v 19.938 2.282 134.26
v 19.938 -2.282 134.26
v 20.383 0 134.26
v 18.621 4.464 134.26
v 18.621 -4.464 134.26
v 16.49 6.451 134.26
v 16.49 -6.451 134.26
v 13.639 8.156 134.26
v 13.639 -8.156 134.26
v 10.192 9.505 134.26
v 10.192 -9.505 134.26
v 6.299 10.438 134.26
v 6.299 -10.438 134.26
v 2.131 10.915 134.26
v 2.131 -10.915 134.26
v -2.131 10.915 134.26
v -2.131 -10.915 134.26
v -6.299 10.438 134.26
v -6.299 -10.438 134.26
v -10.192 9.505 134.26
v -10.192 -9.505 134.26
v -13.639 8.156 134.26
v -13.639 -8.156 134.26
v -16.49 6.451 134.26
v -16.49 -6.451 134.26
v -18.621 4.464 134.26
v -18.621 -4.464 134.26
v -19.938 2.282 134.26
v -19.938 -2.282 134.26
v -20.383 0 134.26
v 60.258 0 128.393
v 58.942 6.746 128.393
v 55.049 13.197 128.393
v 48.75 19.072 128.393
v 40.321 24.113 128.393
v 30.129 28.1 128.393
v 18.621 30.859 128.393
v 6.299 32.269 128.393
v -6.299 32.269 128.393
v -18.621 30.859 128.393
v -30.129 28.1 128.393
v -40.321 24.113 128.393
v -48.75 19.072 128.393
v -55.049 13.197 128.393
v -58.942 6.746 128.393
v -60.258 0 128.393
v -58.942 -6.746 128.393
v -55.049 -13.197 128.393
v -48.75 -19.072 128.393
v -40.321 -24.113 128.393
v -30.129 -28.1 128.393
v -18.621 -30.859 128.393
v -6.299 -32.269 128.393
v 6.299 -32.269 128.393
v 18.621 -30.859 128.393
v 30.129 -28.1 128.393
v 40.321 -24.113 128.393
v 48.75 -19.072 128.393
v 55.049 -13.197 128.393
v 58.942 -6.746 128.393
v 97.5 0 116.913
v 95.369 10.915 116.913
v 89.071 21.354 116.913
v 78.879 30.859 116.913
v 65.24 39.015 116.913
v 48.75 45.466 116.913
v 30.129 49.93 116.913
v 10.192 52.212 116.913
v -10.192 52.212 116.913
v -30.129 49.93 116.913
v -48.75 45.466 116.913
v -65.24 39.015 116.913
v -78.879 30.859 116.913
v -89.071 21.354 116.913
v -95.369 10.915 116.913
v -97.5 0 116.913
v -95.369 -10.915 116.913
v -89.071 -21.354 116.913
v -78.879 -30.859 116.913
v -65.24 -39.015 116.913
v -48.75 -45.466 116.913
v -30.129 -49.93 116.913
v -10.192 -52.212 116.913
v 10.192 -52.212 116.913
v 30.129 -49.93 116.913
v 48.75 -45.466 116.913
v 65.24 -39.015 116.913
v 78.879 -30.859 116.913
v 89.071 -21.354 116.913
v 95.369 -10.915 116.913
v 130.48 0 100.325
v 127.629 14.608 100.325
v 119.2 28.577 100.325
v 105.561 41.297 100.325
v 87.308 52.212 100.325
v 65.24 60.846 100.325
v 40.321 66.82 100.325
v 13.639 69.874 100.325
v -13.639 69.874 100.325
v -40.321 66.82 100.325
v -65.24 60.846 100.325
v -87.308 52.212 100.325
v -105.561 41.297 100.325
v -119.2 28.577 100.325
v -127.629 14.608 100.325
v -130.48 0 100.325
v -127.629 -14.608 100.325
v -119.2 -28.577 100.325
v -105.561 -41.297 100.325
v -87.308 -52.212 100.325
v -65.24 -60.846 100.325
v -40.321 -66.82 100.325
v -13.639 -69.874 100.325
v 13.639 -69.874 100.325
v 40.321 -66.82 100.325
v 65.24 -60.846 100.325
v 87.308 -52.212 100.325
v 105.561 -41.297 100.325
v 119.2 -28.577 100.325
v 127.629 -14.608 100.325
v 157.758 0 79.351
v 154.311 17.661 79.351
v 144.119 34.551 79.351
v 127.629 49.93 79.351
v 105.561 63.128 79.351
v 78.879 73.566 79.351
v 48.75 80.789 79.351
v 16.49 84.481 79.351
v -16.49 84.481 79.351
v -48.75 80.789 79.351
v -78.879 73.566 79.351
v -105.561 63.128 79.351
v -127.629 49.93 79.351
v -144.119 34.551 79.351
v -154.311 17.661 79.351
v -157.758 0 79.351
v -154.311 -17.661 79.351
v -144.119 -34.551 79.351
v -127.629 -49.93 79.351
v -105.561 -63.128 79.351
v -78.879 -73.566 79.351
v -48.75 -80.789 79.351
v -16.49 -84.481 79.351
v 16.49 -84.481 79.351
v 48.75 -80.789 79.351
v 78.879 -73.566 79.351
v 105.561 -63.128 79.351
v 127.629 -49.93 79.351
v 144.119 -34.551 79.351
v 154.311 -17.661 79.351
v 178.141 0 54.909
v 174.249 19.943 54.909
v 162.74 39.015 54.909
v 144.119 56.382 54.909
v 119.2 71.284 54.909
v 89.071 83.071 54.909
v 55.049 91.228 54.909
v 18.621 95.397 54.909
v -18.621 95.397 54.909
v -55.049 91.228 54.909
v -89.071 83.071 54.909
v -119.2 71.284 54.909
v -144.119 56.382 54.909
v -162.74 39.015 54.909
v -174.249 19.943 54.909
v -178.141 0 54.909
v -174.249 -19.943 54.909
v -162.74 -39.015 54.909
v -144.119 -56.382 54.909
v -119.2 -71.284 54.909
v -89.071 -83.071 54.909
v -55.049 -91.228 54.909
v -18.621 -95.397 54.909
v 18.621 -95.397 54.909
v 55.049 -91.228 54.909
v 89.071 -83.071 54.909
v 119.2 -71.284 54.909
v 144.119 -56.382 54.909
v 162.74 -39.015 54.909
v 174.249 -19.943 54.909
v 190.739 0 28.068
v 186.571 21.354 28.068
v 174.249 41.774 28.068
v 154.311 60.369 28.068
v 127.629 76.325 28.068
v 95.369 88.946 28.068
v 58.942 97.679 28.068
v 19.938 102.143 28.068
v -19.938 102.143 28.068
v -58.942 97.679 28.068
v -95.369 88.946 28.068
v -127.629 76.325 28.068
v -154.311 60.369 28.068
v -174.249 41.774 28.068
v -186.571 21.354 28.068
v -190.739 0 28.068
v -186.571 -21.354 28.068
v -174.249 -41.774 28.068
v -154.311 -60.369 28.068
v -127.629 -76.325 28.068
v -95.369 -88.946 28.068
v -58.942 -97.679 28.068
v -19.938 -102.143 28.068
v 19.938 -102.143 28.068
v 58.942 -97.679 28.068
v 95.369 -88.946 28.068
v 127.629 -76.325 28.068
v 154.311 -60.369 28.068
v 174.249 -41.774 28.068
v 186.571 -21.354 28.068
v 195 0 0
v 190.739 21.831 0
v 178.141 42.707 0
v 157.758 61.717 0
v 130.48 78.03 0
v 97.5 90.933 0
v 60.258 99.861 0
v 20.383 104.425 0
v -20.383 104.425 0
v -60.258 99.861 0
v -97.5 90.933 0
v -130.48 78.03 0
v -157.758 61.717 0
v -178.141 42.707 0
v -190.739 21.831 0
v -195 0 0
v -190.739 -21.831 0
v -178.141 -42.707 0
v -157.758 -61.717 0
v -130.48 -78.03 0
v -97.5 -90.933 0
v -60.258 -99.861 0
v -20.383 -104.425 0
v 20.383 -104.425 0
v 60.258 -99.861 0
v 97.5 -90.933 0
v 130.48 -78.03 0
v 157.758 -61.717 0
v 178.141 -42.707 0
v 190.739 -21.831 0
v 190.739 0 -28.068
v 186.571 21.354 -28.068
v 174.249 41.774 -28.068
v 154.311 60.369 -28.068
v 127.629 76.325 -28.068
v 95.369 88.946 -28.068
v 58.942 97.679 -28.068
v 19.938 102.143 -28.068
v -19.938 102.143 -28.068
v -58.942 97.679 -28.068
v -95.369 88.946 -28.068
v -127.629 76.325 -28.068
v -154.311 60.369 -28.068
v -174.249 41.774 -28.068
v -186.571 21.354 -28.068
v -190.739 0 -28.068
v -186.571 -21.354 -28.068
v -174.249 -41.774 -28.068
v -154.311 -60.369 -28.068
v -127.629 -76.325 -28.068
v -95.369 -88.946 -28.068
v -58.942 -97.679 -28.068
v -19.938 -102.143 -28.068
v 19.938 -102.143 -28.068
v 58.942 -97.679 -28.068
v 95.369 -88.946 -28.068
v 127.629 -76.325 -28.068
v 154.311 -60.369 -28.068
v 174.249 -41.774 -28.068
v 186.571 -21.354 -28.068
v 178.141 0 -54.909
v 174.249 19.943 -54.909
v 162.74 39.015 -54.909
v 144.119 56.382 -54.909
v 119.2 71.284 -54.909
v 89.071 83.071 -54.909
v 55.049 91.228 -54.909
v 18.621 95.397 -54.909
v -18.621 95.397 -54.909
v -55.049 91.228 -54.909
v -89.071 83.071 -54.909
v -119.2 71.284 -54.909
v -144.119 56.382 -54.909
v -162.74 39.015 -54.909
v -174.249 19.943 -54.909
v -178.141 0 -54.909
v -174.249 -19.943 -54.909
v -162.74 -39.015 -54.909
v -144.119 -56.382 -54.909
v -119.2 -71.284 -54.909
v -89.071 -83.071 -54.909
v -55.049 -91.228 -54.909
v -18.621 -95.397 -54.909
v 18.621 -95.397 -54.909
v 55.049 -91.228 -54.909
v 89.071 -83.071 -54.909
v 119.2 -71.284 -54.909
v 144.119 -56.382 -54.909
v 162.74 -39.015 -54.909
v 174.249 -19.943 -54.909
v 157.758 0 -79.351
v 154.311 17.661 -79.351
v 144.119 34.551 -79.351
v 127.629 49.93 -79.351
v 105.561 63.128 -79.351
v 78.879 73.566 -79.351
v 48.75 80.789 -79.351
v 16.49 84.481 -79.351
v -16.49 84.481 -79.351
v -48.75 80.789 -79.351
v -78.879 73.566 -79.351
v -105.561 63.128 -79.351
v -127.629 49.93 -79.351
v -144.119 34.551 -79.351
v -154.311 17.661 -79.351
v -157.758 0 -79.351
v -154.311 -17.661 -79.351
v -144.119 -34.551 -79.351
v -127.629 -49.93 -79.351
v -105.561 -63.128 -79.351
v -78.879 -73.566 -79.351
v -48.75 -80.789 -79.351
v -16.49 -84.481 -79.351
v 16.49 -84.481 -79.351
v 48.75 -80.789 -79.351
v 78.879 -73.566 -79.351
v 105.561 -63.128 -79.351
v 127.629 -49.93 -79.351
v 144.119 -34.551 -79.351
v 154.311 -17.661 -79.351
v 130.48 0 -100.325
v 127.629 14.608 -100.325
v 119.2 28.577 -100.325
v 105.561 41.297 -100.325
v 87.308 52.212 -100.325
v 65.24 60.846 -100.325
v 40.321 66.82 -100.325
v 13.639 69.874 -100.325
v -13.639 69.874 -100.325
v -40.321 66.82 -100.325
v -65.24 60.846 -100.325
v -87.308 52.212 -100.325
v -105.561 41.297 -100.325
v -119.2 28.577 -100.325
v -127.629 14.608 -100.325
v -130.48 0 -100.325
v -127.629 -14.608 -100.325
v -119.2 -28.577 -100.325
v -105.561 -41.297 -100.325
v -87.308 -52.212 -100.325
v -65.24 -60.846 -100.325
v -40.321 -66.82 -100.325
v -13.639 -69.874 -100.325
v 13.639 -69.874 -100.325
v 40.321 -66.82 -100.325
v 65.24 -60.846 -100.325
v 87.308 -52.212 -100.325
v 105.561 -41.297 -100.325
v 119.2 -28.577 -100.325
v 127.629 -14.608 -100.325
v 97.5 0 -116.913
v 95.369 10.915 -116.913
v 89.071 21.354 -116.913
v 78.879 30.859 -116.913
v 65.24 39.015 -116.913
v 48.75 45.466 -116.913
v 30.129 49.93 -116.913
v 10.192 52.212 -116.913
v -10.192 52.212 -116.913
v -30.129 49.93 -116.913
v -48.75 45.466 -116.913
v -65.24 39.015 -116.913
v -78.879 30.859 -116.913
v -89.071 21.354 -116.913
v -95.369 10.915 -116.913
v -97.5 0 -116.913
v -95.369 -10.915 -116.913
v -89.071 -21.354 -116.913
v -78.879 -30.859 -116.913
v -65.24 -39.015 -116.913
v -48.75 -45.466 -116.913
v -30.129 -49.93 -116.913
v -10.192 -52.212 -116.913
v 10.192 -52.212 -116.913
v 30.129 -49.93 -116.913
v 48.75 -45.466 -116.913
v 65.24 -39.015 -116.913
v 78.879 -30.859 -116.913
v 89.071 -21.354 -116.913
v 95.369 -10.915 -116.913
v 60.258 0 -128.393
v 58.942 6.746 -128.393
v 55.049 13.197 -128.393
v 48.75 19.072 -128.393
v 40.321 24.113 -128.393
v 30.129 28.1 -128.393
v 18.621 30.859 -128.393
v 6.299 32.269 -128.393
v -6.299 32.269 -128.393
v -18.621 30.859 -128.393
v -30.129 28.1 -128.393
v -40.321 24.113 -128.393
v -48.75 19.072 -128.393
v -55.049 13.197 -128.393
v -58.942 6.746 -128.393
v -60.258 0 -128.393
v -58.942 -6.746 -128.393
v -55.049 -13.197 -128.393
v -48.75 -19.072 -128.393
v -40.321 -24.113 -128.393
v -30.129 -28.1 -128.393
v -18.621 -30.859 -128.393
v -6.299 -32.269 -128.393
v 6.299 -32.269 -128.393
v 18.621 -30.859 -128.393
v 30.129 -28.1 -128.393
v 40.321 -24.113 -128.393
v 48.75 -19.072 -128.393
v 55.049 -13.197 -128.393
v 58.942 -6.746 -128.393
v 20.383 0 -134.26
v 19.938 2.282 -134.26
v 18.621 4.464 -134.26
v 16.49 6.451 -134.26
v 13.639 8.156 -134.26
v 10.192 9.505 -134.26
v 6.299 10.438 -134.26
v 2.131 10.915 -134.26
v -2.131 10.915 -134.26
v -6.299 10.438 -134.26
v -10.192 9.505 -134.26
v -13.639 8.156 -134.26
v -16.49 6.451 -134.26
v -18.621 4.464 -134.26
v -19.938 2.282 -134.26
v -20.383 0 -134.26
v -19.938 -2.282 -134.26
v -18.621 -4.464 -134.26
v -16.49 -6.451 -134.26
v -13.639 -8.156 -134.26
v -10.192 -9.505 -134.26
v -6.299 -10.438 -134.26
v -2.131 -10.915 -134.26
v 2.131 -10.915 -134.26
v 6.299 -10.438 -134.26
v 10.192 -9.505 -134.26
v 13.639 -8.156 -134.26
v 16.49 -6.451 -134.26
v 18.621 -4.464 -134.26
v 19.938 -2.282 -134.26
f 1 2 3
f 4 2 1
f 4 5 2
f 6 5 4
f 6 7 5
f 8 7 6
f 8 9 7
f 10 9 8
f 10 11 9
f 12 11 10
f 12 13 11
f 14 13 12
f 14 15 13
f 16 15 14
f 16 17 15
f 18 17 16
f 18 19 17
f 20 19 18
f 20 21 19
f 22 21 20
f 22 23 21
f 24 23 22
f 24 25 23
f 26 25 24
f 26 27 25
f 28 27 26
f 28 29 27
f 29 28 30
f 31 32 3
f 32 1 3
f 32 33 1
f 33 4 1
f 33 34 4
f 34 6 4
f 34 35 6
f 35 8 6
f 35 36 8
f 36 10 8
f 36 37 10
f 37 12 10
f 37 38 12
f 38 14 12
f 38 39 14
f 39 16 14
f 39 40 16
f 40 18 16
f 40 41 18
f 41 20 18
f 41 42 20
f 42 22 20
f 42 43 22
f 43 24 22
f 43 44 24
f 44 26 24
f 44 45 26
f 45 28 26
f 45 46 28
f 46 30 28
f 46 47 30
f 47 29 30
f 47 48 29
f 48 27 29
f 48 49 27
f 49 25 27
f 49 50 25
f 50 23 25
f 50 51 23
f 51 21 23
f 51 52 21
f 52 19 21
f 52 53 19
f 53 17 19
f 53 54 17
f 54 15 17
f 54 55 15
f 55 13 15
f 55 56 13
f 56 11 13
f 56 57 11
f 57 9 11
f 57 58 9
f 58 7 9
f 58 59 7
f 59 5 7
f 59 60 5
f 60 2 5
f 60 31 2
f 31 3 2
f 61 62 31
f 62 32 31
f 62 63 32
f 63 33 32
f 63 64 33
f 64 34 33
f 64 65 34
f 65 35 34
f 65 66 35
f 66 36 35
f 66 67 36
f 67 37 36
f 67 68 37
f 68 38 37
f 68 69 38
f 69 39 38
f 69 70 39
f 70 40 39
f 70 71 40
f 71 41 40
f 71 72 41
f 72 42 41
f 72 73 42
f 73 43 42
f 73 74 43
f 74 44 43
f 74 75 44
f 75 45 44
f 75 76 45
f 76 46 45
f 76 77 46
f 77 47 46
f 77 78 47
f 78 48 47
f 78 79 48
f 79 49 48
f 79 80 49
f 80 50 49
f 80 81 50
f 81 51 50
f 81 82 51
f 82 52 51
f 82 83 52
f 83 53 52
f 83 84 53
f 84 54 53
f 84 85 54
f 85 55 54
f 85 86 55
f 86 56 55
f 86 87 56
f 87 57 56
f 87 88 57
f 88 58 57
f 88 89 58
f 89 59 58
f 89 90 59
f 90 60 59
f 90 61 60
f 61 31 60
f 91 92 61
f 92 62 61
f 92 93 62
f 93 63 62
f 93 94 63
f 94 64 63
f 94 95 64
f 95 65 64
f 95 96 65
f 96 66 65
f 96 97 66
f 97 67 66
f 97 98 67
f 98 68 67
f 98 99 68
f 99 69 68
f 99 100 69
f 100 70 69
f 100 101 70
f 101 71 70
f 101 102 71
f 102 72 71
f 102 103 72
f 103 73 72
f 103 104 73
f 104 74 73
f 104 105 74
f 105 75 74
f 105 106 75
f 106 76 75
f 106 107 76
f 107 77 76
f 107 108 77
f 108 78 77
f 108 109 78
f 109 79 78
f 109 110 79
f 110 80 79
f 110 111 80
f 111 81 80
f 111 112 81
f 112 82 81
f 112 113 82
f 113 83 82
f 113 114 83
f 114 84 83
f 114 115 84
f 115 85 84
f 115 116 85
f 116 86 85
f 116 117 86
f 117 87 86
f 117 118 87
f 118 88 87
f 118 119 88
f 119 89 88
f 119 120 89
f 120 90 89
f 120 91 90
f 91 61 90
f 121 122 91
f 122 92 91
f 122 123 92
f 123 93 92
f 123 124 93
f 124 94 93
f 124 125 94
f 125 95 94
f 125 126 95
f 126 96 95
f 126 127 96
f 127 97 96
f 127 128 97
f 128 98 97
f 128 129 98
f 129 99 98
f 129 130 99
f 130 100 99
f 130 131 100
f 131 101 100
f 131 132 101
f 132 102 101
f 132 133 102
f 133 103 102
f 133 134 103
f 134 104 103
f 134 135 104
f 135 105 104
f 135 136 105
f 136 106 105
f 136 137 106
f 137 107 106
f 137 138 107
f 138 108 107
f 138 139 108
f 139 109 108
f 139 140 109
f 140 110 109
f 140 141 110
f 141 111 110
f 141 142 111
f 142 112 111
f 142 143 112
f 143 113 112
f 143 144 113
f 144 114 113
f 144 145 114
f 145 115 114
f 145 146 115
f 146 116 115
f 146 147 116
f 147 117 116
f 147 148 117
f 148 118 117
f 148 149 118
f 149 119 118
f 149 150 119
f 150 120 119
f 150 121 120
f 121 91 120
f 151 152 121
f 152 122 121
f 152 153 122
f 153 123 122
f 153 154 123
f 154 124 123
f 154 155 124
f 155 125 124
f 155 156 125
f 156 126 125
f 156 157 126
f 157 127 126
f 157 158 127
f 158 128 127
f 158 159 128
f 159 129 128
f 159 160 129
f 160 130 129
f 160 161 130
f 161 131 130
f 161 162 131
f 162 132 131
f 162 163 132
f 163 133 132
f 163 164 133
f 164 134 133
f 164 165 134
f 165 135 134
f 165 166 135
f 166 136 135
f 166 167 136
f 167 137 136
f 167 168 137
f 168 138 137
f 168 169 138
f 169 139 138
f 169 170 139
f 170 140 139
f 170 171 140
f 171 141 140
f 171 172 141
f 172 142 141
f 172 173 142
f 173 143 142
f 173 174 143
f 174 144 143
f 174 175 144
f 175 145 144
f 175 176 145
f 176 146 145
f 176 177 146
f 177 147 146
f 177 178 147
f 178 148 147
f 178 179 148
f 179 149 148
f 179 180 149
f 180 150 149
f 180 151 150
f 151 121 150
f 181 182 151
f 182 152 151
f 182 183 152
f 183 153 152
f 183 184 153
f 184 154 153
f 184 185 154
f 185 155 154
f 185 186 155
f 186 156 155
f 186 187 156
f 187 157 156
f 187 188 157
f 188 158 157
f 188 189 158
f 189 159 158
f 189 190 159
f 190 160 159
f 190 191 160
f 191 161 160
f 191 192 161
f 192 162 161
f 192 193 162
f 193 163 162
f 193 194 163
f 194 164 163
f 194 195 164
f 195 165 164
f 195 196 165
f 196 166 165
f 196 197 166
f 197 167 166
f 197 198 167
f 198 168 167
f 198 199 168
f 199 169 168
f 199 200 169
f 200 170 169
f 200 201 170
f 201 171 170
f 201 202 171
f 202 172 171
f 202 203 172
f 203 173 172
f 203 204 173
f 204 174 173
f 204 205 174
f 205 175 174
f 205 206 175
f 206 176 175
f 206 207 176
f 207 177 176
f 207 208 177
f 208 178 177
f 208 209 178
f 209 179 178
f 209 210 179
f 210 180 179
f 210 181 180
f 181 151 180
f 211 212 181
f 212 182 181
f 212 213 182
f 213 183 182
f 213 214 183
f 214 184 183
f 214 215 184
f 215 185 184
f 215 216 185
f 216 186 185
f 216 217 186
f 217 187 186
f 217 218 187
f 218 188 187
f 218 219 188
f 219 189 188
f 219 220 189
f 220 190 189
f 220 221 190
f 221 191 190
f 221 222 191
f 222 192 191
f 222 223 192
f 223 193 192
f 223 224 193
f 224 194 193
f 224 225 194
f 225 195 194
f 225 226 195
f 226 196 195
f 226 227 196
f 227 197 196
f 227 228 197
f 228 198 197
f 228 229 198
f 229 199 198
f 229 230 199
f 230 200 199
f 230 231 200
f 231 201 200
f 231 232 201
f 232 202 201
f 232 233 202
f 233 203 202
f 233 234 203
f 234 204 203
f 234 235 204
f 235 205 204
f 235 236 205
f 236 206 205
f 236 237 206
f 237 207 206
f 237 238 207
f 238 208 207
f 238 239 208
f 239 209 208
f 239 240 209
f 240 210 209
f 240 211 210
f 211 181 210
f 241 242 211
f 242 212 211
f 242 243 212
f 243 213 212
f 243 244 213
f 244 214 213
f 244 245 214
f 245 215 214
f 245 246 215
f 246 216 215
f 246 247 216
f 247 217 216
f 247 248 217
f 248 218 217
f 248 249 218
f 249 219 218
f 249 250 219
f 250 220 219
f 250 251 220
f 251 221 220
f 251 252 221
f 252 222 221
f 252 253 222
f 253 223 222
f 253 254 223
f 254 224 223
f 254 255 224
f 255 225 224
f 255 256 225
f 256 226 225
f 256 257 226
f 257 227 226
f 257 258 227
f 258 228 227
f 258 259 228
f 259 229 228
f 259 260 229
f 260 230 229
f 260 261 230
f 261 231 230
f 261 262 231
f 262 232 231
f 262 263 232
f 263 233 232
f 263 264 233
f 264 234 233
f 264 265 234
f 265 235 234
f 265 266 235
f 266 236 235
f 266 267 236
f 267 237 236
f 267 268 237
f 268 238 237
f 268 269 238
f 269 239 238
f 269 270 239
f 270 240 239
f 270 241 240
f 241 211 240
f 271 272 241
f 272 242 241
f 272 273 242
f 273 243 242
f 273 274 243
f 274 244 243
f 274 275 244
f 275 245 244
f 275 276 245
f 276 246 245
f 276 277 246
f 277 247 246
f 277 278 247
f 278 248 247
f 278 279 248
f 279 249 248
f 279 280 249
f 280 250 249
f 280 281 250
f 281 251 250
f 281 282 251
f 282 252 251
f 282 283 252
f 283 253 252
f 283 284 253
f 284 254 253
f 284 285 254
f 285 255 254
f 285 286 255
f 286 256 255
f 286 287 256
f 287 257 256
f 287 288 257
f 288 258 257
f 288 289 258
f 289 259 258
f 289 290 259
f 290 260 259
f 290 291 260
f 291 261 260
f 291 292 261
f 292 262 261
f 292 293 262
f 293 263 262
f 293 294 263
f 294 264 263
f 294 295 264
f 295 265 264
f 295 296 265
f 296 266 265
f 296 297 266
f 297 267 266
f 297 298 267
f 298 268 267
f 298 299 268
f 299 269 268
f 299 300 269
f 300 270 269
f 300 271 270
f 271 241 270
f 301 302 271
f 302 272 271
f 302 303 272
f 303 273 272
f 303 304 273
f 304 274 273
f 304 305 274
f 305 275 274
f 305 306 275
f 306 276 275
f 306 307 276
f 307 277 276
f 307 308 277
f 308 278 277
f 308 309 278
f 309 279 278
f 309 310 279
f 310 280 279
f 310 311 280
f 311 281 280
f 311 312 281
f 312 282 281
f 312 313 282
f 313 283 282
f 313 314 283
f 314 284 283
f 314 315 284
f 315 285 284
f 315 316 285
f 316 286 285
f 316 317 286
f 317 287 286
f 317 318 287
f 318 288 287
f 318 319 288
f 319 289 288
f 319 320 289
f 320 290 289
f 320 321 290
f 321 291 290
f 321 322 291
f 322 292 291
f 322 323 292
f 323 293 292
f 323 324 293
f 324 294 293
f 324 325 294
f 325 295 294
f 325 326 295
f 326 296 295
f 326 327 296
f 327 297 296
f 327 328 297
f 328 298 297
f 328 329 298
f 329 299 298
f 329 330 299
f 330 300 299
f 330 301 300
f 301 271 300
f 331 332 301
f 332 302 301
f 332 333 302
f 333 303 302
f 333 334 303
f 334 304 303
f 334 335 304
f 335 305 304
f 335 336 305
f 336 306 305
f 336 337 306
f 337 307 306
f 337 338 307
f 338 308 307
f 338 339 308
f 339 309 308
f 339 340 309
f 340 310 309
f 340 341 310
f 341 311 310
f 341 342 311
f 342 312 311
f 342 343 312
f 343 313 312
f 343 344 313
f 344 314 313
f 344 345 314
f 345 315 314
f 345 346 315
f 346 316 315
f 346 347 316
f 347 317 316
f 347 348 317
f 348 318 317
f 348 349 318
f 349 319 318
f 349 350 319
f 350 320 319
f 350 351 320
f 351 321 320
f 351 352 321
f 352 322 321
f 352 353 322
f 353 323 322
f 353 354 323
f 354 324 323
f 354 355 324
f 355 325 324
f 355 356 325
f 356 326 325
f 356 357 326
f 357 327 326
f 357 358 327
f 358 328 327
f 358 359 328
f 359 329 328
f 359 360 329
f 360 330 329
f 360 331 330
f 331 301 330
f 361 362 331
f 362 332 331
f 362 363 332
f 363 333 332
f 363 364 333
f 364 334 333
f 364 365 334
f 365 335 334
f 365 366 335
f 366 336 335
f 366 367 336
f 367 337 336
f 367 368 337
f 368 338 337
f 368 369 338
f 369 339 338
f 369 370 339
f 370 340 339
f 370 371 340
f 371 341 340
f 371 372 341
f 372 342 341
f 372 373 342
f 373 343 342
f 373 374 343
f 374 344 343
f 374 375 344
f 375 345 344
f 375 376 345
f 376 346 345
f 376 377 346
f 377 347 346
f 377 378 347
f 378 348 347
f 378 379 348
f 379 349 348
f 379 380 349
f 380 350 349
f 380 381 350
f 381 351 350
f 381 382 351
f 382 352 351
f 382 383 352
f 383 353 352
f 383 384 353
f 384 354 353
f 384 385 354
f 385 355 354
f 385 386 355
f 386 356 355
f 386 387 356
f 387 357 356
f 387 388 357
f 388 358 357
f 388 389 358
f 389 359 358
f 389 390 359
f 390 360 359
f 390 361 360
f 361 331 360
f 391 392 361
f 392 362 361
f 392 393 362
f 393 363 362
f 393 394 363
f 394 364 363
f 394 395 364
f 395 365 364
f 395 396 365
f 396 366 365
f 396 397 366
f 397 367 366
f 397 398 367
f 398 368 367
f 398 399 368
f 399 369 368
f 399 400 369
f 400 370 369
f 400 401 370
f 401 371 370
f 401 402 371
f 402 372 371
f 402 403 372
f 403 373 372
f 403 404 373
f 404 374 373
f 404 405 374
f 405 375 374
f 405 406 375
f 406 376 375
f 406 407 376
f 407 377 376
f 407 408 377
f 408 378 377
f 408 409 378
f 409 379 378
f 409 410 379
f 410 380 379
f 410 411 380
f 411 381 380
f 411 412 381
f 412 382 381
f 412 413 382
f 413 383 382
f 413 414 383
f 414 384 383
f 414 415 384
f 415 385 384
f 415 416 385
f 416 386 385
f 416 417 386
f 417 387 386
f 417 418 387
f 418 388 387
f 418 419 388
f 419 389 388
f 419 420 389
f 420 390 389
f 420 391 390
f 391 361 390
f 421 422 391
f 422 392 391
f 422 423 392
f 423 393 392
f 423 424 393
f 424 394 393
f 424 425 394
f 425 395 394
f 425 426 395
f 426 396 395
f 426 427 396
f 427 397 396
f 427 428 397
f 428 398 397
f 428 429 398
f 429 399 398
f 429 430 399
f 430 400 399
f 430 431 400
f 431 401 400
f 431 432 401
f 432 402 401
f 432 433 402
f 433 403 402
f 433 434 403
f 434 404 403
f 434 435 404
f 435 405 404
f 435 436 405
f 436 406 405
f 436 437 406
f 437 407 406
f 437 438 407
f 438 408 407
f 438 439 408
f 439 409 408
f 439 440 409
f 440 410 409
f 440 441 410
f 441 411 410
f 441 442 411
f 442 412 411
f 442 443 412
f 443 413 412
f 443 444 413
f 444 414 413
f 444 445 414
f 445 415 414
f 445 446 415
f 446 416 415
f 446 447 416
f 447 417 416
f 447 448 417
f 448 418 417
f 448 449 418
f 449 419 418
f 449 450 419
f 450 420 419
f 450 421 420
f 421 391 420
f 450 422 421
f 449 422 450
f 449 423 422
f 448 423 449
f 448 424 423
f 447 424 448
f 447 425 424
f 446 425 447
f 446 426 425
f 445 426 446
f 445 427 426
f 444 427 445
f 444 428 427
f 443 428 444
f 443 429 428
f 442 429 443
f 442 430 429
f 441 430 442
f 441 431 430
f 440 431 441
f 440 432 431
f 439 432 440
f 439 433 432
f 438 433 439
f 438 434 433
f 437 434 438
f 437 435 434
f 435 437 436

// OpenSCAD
// Generated by SolidPython 1.0.1 on 2020-07-29 00:46:50


scale(v = [13, 7, 9]) {
	sphere(r = 15);
}
/***********************************************
*********      SolidPython code:      **********
************************************************
 
# import packages: SolidPython
from solid import *
from solid.utils import *
from itertools import chain, combinations, permutations


class Resize:

    def __init__(self, scad_file):
        self.scad_file = scad_file
        #self.scad_file = import_scad(scad_file)
        # cone/cylinder param:
        self.r1 = 0
        self.r2 = 0
        self.h = 0
        # rectangular prism param:
        self.w = 0
        self.l = 0
        # ellipse param:
        self.r = 0

    # import OpenScad code (file name corresponds to shape)


    # classify shape + parameters
    def assign(self, param1, param2, param3):
        if self.scad_file == 'cone.scad':
            self.r1 = param1
            self.r2 = param2
            self.h = param3
        elif self.scad_file == 'cylinder.scad':
            self.r1 = param1
            self.r2 = param2
            self.h = param3
        elif self.scad_file == 'rectangularPrism.scad':
            self.h = param1
            self.l = param2
            self.w = param3
        else:
            self.r = param1
            self.h = param2

    # resize parameters
    def iterate(self):
        x = range(3, 20, 2)
        i = 1
        if self.scad_file == 'cone.scad':
            tempList = list(permutations(x, 2))
            for temp in tempList:
                param1 = temp[0]
                param2 = temp[1]
                filepath = 'produced_scad_files/' + 'cone' + str(param1) + '_' + str(param2) + '_' + '.scad'
                scad_render_to_file(cylinder(h=param1, r1=param2, r2=0), filepath)

        elif self.scad_file == 'cylinder.scad':
            tempList = list(permutations(x, 3))
            for temp in tempList:
                param1 = temp[0]
                param2 = temp[1]
                filepath = 'produced_scad_files/' + 'cylinder' + str(param1) + '_' + str(param2) + '_' + '.scad'
                scad_render_to_file(cylinder(h=param1, r1=param2, r2=param2), filepath)

        elif self.scad_file == 'rectangularPrism.scad':
            tempList = list(permutations(x, 3))
            for temp in tempList:
                param1 = temp[0]
                param2 = temp[1]
                param3 = temp[2]
                filepath = 'produced_scad_files/' + 'rectangularPrism' + str(param1) + '_' + str(param2) + '_' + str(
                    param3) + '.scad'
                scad_render_to_file(cube(size=(param1, param2, param3)), filepath)

        elif self.scad_file == 'ellipse.scad':
            tempList = list(permutations(x, 4))
            for temp in tempList:
                param1 = temp[0]
                param2 = temp[1]
                param3 = temp[2]
                param4 = temp[3]
                filepath = 'produced_scad_files/' + 'ellipse' + str(param1) + '_' + str(param2) + '_' + str(param3) + '_' + str(param4) + '.scad'
                scad_render_to_file(scale([param1, param2, param3])(sphere(r=param4)), filepath)

    def render_to_scadfile(self):
        scad_render_to_file(scad, 'example.scad') 
 
************************************************/
